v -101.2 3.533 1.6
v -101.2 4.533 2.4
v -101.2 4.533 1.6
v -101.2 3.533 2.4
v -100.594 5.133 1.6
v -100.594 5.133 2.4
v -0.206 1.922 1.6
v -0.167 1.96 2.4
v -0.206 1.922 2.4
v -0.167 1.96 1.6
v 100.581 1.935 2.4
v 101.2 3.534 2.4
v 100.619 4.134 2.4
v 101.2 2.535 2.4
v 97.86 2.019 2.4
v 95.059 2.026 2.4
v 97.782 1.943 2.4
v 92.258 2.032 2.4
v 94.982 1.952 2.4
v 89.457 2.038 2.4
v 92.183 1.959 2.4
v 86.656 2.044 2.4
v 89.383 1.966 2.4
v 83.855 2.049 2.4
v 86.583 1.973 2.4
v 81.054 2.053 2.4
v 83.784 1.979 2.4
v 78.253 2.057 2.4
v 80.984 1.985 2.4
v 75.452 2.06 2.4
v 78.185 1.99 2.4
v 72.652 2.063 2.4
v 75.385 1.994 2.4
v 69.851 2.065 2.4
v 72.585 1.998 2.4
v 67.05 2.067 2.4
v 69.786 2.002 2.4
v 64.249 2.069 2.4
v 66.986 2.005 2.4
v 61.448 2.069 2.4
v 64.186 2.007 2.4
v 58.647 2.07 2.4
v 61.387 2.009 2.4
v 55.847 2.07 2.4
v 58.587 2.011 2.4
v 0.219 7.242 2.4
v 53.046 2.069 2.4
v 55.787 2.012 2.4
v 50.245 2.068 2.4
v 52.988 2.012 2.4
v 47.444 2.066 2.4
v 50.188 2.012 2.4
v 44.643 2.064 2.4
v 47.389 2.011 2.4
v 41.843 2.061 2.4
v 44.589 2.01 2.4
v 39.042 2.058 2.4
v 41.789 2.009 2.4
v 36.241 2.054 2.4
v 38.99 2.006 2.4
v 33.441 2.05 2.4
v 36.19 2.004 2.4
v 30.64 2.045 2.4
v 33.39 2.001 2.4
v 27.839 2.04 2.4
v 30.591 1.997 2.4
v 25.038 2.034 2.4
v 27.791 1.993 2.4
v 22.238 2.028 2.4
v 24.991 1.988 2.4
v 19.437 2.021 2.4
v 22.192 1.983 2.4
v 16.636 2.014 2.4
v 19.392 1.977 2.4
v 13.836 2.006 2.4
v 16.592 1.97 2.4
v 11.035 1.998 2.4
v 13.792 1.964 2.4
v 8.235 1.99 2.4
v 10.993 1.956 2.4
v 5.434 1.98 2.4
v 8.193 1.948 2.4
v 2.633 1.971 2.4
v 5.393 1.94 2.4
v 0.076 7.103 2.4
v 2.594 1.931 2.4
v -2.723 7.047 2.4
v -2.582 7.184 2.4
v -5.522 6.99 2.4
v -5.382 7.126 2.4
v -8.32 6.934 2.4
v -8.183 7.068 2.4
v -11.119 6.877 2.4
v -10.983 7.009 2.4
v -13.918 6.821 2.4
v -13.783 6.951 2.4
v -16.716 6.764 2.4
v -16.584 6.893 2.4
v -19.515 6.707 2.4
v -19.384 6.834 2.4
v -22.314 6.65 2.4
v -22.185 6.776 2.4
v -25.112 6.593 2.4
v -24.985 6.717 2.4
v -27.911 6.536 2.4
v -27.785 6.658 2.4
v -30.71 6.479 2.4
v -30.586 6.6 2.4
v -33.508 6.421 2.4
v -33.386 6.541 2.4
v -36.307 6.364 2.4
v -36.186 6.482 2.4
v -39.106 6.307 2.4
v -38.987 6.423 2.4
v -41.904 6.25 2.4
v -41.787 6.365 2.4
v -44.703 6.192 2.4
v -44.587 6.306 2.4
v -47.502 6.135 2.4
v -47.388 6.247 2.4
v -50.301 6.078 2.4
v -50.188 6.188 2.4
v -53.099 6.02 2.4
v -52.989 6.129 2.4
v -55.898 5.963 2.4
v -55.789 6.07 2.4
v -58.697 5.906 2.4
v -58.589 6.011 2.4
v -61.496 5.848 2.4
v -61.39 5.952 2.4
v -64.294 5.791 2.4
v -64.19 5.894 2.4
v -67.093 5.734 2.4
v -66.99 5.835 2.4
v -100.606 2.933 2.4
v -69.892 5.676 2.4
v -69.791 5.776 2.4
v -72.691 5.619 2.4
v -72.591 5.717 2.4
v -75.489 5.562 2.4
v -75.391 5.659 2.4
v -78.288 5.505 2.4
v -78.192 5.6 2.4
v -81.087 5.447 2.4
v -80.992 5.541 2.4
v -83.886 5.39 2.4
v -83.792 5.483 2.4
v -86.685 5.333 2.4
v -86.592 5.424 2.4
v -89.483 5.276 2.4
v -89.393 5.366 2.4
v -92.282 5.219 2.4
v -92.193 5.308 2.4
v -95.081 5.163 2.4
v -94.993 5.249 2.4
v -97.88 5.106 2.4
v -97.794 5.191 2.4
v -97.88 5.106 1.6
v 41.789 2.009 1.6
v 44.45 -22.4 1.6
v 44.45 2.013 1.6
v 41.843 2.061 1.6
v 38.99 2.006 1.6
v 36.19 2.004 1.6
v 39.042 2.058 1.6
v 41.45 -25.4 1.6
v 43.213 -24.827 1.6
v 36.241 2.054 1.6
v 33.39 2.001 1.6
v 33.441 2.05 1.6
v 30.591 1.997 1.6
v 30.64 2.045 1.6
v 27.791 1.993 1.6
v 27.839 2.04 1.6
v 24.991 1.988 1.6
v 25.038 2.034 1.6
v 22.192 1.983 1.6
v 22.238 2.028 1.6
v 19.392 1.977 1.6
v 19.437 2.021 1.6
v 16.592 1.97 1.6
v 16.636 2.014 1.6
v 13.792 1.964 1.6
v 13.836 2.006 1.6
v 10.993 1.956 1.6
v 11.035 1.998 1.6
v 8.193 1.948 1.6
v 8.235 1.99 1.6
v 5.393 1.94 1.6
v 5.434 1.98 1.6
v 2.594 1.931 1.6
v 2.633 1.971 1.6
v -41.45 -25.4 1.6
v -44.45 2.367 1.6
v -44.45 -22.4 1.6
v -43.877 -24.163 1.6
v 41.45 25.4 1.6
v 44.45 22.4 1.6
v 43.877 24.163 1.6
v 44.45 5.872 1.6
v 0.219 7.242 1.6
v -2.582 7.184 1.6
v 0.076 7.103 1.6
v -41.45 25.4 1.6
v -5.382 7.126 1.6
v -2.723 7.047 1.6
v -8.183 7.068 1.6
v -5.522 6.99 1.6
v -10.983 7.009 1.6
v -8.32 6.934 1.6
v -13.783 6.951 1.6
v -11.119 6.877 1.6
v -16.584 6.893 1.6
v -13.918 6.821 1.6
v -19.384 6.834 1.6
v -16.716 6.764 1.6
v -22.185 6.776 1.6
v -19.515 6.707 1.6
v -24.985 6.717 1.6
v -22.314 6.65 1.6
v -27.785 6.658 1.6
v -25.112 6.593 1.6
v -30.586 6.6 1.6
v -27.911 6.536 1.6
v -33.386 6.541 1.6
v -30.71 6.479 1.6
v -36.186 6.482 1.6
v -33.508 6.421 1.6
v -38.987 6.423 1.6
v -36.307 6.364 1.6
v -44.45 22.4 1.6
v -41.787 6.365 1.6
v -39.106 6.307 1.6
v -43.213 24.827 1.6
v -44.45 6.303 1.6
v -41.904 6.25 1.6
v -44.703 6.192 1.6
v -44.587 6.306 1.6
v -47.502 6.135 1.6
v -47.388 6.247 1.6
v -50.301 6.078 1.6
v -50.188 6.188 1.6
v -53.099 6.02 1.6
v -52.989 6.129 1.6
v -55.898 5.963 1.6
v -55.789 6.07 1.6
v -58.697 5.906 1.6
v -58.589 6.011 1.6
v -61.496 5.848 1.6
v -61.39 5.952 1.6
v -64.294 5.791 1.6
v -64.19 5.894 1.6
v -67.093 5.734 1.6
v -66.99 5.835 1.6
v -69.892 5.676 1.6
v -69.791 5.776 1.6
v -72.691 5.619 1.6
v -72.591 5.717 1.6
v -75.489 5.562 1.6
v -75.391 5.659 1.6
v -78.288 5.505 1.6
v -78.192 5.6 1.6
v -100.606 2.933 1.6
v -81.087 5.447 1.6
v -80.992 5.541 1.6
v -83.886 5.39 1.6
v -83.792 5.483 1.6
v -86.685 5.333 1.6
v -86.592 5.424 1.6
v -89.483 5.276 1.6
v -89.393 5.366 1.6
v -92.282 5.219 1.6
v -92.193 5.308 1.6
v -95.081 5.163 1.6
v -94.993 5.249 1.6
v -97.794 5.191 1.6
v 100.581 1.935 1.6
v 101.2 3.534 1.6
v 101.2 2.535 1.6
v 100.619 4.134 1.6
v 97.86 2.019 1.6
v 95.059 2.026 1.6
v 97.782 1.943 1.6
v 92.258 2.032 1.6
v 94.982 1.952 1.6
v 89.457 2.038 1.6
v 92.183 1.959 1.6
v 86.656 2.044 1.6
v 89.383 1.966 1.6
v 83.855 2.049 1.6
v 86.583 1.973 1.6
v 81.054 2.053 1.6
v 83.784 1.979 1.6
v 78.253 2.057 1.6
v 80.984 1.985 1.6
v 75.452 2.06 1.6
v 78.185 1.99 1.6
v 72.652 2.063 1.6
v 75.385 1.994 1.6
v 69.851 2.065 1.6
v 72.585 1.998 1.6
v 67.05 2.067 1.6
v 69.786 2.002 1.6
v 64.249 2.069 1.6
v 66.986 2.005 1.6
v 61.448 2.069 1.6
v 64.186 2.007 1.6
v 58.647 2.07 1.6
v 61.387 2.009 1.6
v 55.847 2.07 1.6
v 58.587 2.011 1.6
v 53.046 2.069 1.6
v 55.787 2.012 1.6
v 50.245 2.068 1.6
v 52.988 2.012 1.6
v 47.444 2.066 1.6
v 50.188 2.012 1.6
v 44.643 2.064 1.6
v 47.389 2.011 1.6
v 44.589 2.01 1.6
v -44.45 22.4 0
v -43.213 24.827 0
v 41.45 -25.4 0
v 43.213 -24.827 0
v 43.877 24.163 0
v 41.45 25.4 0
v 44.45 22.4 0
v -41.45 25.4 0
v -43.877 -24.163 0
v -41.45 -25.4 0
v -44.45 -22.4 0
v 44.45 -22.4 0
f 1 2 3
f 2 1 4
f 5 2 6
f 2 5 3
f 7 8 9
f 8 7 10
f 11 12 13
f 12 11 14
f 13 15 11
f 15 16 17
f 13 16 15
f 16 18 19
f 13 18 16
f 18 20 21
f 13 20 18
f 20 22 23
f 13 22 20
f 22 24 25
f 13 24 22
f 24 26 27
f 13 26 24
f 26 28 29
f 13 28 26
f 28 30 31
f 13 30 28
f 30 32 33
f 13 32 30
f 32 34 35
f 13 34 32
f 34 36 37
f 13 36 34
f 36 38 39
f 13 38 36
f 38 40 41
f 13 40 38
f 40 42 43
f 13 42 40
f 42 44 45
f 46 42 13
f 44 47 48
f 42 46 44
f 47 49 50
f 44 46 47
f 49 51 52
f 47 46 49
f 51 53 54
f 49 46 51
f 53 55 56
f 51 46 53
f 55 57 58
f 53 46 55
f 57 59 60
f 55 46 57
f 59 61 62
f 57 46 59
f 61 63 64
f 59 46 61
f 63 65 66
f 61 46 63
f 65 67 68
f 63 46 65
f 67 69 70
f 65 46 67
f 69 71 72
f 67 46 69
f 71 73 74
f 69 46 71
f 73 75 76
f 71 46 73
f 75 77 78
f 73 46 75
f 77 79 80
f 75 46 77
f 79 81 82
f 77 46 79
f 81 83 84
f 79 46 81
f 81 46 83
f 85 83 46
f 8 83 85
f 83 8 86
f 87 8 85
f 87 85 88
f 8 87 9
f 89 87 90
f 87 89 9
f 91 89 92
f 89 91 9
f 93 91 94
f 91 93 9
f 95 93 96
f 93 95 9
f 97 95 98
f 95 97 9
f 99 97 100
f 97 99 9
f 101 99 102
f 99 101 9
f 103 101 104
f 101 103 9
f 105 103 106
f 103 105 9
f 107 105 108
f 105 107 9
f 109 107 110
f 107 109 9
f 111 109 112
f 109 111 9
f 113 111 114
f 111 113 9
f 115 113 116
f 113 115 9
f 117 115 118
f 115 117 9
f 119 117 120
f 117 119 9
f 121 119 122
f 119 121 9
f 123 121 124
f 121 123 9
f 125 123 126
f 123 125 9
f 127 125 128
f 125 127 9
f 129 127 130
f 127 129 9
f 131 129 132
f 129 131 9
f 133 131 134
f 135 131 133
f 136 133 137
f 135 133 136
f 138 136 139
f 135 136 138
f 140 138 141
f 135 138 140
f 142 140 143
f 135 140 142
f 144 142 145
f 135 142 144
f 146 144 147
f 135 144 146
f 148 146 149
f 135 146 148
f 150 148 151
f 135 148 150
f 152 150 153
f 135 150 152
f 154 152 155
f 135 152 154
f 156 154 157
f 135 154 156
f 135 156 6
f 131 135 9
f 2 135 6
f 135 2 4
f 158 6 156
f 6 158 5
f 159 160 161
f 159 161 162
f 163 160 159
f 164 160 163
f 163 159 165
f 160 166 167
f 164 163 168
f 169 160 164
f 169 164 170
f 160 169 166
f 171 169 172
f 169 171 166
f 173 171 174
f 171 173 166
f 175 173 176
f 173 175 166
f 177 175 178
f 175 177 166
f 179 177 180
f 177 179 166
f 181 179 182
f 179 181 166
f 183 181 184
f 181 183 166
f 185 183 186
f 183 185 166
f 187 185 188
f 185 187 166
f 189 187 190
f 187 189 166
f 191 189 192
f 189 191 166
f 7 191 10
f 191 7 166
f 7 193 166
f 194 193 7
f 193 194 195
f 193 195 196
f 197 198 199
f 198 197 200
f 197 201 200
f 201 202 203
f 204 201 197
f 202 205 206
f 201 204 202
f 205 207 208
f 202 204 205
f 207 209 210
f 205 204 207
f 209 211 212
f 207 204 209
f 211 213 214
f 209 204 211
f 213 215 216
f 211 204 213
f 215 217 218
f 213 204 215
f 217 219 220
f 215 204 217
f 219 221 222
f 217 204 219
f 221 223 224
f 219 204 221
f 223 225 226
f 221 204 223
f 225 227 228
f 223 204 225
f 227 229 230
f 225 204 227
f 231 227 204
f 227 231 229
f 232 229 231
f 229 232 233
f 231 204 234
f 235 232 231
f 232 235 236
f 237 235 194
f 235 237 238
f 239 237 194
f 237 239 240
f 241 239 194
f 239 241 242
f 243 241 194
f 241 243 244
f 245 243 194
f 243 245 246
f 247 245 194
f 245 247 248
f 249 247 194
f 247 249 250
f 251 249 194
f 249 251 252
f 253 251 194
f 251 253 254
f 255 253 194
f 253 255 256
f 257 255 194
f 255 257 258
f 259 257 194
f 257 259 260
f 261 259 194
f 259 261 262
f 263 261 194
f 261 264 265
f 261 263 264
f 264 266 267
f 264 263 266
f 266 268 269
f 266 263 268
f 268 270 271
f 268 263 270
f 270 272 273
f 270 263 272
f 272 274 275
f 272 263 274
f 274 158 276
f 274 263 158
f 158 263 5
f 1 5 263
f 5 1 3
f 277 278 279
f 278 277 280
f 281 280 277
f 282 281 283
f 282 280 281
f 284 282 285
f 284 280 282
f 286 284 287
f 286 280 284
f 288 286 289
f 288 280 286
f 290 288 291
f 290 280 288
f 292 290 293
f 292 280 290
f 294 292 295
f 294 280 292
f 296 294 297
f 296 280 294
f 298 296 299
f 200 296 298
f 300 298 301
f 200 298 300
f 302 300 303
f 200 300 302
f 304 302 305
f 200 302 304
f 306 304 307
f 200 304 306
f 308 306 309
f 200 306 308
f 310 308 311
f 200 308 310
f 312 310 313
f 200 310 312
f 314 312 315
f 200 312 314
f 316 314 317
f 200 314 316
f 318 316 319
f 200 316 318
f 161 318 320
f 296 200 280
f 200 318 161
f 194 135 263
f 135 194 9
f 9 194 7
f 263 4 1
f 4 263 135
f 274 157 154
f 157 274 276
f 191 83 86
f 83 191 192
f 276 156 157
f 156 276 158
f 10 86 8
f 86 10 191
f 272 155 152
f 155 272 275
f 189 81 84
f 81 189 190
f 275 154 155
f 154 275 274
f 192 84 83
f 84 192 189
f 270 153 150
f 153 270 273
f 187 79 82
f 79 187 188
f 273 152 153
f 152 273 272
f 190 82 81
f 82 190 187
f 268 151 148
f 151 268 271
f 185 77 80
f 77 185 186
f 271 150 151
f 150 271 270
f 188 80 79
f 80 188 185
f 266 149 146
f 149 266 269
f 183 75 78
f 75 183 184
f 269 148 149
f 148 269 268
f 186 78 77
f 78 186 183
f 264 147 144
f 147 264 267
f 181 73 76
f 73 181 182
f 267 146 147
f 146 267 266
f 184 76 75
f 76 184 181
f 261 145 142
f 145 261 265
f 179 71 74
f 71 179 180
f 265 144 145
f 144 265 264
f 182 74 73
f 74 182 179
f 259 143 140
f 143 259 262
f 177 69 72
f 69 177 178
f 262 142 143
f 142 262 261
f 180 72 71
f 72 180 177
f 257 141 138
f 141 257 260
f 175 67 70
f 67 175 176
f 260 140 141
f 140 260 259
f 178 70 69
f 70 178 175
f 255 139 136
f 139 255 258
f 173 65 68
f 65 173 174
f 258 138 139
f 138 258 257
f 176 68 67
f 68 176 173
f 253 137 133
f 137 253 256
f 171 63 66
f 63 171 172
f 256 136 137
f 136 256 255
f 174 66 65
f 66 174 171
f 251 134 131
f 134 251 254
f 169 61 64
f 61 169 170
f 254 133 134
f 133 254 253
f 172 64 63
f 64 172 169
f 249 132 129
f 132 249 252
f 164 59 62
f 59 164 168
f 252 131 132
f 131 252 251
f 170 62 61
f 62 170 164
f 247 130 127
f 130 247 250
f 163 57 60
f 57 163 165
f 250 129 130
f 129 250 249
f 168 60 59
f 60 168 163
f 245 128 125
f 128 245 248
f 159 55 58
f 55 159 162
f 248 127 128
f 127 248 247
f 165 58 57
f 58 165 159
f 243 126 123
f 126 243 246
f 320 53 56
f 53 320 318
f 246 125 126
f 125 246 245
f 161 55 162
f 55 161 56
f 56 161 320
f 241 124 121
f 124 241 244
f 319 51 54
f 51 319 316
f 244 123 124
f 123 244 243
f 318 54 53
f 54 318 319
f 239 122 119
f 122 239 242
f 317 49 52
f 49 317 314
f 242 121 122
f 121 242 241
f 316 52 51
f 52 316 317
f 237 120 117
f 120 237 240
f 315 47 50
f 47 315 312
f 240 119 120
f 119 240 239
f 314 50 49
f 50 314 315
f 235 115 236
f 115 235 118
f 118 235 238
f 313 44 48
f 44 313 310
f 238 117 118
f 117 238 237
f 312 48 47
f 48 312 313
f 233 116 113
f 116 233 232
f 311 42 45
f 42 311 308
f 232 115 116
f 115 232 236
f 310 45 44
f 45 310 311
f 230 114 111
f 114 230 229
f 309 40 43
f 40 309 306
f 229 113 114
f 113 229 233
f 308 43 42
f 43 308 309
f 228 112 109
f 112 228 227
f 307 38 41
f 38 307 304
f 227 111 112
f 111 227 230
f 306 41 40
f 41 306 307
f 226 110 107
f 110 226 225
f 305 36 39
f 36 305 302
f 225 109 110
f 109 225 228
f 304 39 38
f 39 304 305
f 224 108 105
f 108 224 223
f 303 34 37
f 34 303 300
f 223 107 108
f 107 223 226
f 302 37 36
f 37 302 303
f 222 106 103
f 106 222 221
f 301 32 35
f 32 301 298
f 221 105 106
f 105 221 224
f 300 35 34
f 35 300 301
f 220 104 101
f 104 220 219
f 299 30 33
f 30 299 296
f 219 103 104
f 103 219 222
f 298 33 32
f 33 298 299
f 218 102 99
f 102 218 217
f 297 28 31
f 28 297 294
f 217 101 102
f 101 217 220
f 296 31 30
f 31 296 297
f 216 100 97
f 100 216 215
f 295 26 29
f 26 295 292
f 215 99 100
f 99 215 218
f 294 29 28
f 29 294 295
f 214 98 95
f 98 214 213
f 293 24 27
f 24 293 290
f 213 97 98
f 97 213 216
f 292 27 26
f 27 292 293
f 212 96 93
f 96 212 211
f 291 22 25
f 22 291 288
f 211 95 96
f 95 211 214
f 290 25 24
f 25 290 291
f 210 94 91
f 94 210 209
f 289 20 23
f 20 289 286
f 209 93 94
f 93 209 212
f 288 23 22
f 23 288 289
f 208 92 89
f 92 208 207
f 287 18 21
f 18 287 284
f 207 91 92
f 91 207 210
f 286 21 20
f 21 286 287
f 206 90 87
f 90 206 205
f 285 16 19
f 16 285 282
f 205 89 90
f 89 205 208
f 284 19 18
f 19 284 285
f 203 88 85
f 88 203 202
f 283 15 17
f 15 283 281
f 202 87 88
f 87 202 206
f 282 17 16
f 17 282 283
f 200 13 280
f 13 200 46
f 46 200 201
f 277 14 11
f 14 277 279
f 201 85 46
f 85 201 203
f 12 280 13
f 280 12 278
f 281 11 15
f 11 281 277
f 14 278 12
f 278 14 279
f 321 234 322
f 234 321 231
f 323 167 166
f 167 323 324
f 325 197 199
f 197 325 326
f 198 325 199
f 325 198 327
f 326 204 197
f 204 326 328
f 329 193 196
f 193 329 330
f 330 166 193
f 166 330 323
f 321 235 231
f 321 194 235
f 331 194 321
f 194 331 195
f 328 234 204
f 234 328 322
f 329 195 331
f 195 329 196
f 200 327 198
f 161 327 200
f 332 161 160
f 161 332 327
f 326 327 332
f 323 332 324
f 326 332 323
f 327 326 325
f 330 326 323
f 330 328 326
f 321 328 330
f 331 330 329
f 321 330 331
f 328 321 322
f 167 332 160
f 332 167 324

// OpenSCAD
// Contour Handshake™ Business Card
card_w = 88.9;
card_h = 50.8;
corner_radius = 3;
base_thickness = 1.6;
ridge_height = 0.8;
line_width = 2.2;
line_spacing = 2.8;
curve_amplitude = 6;
curve_bias = 4;
swirl_strength = 0.25;

module rounded_rect_2d(w, h, r) {
  offset(r=r) offset(delta=-r) square([w, h], center=true);
}

module card_base() {
  linear_extrude(height=base_thickness)
    rounded_rect_2d(card_w, card_h, corner_radius);
}

module ridge_field(height=ridge_height) {
  for (i = [-18:18]) {
    x = i * line_spacing;
    phase = (x / (card_w / 2)) * swirl_strength;
    translate([x, 0, base_thickness])
      linear_extrude(height=height)
        offset(r=0.6) offset(delta=-0.6)
          polygon([
            [-card_h, sin(i*0.55 + phase)*curve_amplitude + curve_bias],
            [ card_h, cos(i*0.55 - phase)*curve_amplitude - curve_bias],
            [ card_h, cos(i*0.55 - phase)*curve_amplitude - curve_bias + line_width],
            [-card_h, sin(i*0.55 + phase)*curve_amplitude + curve_bias + line_width]
          ]);
  }
}

module contour_handshake_card() {
  union() {
    card_base();
    ridge_field();
  }
}

contour_handshake_card();
